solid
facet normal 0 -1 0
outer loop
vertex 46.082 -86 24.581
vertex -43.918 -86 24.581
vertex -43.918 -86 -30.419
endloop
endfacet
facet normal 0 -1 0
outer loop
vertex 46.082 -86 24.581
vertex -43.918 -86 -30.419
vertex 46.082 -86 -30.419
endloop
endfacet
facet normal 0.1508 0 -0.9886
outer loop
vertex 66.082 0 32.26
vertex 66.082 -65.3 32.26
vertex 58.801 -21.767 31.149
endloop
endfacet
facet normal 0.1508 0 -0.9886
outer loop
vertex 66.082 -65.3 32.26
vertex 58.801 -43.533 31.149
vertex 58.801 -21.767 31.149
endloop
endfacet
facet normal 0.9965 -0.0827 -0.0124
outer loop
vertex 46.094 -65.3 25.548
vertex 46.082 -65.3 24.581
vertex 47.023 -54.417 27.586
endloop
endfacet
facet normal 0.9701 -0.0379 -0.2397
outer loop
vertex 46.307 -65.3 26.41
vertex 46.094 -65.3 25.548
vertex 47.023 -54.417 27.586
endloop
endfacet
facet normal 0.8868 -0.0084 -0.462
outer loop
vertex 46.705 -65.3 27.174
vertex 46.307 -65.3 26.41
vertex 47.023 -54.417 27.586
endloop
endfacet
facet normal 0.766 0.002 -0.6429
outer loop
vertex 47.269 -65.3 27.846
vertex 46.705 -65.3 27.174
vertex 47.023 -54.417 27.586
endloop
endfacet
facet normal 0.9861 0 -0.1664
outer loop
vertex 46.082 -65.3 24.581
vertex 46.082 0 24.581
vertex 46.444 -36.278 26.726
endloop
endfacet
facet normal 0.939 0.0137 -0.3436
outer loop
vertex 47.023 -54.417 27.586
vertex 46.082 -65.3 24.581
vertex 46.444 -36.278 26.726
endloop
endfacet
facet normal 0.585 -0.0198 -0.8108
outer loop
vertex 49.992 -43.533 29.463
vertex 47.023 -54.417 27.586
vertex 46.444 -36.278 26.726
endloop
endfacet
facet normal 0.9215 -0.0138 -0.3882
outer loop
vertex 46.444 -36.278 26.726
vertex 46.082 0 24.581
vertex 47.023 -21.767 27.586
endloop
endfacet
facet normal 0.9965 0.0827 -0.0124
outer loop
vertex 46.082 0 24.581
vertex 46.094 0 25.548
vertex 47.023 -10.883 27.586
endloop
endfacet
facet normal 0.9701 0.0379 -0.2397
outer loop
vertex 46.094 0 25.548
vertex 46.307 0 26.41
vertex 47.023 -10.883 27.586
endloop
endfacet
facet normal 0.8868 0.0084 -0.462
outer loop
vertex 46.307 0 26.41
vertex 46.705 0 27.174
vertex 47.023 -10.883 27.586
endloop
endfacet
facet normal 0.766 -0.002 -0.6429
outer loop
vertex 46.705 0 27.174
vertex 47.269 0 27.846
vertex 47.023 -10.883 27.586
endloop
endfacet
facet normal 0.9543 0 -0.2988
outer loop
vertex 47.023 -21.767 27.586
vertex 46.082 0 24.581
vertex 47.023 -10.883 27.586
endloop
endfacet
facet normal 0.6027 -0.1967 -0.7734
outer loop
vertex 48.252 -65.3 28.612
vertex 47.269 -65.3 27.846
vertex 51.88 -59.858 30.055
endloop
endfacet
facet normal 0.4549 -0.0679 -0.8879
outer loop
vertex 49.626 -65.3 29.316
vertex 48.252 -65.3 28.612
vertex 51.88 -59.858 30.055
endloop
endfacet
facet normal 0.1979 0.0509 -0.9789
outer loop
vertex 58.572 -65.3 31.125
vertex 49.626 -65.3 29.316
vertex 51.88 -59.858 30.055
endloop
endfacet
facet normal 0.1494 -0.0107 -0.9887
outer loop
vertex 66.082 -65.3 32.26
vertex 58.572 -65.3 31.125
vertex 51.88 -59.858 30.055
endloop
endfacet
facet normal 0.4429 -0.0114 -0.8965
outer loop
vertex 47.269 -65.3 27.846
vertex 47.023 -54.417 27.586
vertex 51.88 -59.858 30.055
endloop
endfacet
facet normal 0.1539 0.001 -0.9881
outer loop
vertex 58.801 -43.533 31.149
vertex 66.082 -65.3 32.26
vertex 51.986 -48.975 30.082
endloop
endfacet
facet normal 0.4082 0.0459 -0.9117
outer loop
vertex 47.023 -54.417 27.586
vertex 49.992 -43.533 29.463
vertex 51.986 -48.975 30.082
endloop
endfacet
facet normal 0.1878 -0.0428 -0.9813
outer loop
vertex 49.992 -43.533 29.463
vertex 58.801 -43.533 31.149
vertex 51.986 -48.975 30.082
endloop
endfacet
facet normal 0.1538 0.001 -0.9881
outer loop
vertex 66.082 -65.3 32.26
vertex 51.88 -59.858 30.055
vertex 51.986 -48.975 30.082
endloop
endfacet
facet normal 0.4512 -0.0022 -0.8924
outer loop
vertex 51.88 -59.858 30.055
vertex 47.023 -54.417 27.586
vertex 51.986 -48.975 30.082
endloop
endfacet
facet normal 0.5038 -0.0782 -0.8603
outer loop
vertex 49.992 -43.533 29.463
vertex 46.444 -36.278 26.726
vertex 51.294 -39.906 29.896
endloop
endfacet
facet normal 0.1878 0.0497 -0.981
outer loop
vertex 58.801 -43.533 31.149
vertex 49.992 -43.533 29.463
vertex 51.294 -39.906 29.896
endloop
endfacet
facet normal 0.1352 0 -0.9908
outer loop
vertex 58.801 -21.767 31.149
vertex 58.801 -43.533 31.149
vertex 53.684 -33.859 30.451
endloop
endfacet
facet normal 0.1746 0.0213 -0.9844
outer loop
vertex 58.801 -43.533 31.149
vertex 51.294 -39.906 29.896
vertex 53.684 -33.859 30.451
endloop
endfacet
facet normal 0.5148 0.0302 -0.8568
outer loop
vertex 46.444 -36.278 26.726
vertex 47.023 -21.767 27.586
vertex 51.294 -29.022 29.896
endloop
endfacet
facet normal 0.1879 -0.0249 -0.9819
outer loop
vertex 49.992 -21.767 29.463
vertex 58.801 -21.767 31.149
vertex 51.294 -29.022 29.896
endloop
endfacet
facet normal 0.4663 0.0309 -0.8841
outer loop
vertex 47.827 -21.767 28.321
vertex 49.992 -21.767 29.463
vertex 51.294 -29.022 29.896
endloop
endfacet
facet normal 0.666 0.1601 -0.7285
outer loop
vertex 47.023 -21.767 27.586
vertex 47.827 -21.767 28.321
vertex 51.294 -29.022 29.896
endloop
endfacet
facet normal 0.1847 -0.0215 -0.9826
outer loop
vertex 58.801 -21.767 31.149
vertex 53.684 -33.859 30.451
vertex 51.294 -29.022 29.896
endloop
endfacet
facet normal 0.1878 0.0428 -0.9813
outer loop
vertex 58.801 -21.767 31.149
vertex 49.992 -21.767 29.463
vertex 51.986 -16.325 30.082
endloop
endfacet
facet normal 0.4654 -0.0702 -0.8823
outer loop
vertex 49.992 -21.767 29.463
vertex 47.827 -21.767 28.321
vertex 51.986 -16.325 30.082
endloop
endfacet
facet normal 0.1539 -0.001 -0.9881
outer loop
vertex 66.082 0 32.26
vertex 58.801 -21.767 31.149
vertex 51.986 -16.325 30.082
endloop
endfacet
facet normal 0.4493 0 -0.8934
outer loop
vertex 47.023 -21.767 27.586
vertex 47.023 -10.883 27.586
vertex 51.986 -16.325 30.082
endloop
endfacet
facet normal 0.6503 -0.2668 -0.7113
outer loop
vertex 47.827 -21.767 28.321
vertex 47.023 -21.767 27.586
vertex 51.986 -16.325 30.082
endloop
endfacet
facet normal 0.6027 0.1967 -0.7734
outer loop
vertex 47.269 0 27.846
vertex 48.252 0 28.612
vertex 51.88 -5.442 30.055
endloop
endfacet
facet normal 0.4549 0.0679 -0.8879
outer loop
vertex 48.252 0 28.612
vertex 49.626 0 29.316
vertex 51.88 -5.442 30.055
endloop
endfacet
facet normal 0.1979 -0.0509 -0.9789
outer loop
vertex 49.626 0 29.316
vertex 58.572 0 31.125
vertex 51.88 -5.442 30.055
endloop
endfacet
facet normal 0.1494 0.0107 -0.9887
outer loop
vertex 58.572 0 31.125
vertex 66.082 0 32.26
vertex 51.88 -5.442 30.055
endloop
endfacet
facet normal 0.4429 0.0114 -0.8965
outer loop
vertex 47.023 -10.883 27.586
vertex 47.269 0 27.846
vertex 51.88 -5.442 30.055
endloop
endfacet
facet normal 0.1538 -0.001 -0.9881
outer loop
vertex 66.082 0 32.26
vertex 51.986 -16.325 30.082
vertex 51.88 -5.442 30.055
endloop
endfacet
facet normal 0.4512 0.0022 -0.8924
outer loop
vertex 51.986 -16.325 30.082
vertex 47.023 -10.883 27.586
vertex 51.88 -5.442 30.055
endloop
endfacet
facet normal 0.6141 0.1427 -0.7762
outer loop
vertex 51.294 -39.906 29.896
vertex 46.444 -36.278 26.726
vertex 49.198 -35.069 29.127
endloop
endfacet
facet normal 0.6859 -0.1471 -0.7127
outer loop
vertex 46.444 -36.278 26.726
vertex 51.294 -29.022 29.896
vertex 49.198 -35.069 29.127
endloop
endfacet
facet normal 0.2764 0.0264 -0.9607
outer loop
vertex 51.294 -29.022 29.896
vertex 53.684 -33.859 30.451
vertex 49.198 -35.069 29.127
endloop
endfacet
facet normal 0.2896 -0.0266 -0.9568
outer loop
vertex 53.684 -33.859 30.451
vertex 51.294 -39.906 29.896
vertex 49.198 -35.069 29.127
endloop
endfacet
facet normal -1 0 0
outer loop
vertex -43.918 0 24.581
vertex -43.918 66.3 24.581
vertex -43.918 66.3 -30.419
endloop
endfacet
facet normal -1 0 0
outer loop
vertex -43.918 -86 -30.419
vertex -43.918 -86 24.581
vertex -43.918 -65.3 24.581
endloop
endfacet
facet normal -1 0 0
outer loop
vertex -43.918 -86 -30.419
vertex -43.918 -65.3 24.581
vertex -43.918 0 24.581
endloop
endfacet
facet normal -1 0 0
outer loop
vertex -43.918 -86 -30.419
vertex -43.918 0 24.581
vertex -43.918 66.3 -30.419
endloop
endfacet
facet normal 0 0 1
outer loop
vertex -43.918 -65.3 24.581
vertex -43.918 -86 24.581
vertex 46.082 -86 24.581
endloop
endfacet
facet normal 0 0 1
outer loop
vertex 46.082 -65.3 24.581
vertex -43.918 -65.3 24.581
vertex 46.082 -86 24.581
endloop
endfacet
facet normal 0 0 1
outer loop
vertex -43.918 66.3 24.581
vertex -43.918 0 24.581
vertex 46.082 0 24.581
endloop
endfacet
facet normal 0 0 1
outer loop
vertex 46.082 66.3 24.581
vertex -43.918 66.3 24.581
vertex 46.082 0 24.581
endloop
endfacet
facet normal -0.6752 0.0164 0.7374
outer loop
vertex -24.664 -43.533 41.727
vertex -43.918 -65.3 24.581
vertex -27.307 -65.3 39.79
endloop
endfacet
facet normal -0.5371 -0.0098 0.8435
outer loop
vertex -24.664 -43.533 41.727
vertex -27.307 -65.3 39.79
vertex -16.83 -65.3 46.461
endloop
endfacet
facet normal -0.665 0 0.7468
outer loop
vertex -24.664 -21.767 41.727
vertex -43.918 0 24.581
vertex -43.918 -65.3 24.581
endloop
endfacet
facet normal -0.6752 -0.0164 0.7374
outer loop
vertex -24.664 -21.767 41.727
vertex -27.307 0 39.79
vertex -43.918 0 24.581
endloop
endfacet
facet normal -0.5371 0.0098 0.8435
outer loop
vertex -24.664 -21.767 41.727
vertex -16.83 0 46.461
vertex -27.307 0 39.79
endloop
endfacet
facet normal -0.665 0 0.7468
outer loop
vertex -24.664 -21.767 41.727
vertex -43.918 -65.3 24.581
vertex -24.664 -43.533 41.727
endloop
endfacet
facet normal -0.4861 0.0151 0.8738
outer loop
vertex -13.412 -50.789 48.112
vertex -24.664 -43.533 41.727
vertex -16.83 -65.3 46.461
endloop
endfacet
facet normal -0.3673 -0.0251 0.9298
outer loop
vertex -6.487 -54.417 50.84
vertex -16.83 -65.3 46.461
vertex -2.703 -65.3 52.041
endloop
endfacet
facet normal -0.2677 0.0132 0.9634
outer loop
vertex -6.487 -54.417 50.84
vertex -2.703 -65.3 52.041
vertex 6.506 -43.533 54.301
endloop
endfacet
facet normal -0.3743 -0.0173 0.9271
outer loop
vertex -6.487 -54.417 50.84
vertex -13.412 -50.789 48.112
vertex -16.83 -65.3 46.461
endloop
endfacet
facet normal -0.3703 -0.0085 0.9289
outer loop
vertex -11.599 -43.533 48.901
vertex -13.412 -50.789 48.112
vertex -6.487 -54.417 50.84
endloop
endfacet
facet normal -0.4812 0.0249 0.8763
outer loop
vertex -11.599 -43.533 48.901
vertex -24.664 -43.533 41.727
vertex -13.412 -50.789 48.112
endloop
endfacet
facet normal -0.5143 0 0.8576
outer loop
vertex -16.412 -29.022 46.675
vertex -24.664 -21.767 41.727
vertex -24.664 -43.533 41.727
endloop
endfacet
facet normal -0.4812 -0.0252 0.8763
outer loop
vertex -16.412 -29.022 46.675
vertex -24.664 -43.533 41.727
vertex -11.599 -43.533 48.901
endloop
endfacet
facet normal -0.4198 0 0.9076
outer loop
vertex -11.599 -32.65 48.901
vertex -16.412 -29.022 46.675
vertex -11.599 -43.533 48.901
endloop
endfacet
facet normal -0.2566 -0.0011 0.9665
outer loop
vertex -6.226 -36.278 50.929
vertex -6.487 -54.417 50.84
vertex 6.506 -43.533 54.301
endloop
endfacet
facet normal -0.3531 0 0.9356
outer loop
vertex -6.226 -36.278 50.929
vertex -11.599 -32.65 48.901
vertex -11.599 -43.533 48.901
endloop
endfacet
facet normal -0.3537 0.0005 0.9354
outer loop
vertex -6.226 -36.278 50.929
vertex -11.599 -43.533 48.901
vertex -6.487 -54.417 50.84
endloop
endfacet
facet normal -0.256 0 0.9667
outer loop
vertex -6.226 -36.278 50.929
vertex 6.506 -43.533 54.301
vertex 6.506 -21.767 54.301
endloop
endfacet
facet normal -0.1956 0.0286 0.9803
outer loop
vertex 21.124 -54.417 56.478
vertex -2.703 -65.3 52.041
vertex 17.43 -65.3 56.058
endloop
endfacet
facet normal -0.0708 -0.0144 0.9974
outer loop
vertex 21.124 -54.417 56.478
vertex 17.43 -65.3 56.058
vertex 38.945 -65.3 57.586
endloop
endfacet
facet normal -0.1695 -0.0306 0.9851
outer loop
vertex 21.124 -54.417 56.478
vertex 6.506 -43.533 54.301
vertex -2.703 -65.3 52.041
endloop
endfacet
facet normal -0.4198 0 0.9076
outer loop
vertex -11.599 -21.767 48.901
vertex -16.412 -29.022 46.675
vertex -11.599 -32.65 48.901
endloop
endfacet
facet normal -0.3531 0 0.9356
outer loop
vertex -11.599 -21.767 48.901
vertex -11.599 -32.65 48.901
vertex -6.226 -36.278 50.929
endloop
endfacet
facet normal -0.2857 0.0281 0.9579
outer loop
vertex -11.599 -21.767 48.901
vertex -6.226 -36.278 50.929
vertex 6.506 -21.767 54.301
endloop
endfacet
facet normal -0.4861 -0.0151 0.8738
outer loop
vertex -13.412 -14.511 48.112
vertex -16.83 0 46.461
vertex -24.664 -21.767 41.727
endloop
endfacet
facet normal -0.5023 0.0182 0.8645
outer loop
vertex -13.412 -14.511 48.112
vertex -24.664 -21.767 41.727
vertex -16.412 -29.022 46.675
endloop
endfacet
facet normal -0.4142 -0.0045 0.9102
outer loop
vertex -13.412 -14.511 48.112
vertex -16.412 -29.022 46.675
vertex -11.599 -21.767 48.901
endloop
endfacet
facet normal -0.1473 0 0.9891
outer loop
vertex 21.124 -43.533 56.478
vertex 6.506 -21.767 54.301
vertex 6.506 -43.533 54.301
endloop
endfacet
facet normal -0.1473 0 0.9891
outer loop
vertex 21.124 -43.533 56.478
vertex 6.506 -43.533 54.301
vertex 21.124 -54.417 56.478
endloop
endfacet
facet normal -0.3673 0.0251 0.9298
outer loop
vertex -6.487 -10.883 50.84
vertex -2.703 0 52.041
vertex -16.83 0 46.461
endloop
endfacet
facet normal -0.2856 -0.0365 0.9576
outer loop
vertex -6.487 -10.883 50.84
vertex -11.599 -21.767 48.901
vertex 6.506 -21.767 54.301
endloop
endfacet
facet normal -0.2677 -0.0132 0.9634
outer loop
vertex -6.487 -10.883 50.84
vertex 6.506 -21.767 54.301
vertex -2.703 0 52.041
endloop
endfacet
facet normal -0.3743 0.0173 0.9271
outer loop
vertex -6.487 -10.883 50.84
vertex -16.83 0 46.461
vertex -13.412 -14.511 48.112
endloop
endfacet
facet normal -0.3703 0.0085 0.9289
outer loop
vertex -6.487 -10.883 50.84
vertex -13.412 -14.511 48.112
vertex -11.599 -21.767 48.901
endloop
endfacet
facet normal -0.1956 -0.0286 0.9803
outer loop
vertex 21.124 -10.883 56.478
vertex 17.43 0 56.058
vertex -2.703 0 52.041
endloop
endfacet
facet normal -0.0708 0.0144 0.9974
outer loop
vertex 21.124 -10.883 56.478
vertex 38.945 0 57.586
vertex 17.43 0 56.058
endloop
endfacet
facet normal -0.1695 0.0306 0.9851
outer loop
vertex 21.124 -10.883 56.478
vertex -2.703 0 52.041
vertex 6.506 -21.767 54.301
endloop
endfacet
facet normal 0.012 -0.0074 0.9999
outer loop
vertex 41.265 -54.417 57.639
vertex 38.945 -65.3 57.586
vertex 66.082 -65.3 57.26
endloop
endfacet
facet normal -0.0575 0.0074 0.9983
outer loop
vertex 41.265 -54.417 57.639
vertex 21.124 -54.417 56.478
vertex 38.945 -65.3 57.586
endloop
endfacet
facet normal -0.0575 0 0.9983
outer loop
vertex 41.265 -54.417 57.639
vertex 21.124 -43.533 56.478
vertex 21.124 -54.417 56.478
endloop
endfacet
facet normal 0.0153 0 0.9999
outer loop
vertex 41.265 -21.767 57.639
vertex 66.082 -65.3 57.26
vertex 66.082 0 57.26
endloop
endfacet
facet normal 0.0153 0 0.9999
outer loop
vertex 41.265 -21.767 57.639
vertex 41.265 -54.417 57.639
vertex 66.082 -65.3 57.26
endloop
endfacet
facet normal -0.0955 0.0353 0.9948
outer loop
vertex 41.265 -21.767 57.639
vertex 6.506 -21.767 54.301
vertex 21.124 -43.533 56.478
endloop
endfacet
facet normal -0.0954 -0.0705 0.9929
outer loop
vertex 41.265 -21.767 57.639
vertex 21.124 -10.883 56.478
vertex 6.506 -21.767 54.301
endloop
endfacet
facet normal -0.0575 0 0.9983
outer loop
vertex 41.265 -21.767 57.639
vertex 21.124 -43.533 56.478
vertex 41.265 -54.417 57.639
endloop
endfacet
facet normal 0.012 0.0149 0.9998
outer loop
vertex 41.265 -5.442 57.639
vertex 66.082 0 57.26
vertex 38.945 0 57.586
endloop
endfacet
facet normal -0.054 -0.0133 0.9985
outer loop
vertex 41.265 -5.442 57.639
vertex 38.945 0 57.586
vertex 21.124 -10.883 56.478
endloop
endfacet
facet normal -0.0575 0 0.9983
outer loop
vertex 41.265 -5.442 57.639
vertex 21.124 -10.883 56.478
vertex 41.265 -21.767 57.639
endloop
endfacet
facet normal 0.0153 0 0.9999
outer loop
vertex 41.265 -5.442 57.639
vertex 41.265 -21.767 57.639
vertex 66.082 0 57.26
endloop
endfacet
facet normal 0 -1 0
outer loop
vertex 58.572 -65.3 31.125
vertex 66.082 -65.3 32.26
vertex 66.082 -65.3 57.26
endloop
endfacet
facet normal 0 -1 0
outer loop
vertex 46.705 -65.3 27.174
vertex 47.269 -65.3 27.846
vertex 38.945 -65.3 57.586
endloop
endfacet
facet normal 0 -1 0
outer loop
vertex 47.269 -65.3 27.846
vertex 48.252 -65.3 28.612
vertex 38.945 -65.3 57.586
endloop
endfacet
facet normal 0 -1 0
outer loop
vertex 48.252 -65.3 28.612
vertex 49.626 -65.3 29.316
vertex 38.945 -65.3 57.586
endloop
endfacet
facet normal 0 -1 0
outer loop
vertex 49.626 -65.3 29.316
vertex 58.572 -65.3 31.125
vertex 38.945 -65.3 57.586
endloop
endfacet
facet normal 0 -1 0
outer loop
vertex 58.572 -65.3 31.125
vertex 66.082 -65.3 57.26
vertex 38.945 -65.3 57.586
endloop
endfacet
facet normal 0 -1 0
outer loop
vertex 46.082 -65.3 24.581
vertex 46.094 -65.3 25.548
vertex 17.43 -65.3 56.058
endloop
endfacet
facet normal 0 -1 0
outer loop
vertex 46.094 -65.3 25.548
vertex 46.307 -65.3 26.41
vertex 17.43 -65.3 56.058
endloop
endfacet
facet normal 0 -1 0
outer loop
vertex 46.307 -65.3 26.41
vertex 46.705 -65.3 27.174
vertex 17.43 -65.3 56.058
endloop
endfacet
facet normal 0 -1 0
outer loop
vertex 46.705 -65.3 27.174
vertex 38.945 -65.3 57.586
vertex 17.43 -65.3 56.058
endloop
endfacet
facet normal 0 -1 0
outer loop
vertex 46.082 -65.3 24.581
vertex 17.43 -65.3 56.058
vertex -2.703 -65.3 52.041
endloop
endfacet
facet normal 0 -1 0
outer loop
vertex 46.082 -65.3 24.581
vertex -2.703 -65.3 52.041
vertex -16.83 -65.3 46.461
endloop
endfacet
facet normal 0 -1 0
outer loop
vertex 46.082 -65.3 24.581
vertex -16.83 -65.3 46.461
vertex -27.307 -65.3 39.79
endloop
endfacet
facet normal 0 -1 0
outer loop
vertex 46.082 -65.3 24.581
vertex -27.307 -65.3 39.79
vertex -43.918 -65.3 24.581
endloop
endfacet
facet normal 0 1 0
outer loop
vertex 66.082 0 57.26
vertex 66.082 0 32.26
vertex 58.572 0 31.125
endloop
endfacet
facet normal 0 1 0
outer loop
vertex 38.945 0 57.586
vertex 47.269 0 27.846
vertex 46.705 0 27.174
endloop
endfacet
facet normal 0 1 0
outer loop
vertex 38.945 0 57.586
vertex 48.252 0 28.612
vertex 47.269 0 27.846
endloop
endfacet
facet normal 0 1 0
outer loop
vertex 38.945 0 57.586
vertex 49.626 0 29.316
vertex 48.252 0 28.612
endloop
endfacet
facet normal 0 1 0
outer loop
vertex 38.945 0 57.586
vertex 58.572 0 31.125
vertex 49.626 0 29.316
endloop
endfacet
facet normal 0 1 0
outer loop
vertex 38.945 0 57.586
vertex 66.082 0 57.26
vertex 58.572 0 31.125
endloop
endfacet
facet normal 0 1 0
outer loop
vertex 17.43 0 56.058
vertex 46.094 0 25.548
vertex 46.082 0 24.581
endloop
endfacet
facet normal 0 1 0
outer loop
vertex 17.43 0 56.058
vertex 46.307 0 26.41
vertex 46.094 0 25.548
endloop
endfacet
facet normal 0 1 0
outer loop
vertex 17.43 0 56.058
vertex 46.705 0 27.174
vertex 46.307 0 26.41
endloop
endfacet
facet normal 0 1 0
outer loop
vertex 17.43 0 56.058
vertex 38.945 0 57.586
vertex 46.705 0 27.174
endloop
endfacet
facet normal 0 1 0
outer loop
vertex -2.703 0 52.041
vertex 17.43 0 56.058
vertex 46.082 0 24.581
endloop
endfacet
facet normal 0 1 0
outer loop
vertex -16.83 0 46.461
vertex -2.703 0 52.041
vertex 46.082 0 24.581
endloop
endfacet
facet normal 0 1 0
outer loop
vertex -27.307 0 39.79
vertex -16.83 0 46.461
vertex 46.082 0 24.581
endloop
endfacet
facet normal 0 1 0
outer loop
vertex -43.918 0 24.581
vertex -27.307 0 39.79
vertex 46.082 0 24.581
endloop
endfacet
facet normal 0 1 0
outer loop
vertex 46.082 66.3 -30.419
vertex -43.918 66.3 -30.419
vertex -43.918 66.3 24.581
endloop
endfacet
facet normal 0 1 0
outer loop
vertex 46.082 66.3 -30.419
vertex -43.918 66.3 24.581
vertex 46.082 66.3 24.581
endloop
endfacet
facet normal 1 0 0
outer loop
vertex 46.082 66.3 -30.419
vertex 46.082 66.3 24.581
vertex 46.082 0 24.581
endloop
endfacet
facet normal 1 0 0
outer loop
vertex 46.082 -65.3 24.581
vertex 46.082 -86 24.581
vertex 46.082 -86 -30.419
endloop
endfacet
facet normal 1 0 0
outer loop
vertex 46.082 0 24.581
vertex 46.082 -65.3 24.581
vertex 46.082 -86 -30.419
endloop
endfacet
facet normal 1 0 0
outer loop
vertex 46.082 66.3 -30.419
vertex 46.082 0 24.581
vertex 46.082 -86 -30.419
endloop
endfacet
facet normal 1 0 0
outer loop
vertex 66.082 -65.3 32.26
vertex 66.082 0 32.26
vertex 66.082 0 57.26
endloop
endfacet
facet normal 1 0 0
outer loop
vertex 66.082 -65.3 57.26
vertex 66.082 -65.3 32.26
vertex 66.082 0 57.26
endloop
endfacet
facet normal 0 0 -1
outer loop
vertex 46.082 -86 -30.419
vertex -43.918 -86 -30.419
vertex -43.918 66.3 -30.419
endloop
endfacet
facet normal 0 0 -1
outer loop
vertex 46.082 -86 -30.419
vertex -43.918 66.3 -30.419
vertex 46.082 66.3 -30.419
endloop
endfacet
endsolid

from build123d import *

# Parameters (mm, degrees)
F0_W      = 90
F0_H      = 55
F1_DEPTH  = 86
F2_DEPTH  = 12.5
F2_FACE_W = 90
F2_FACE_H = 55
F3_DEPTH  = 53.8
F4_DEPTH  = 65.3


with BuildPart() as f1:
    # F0 (on Front) → F1 (new body)
    with BuildSketch(Plane.XZ):
        with Locations((1.08182, -2.918677)):
            Rectangle(F0_W, F0_H)
    extrude(amount=F1_DEPTH)

    # F0 (on Front) → F2 (join, symmetric)
    with BuildSketch(Plane.XZ):
        with Locations((1.08182, -2.918677)):
            Rectangle(F0_W, F0_H)
    extrude(amount=F2_DEPTH, both=True)

    # F2_face (on face) → F3 (join)
    with BuildSketch(Plane(origin=(1.08182, 12.5, -2.918677), x_dir=(1, 0, 0), z_dir=(0, 1, 0))):
        Rectangle(F2_FACE_W, F2_FACE_H)
    extrude(amount=F3_DEPTH)

    # F0 (on Front) → F4 (join)
    with BuildSketch(Plane.XZ):
        with BuildLine():
            add(Edge.make_bspline(
                [(-43.91818, 24.581323), (-25.125932, 42.331356), (-13.193247, 60.789681), (66.08182, 57.259896)],
                knots=[0, 0, 0, 0, 114.751423, 114.751423, 114.751423, 114.751423], degree=3))
            Line((-43.91818, 24.581323), (46.08182, 24.581323))
            add(Edge.make_bspline(
                [(46.08182, 24.581323), (45.400707, 31.935), (61.706819, 30.563467), (66.08182, 32.259896)],
                knots=[0, 0, 0, 0, 21.423363, 21.423363, 21.423363, 21.423363], degree=3))
            Line((66.08182, 32.259896), (66.08182, 57.259896))
        make_face()
    extrude(amount=F4_DEPTH)


solid = f1.part
